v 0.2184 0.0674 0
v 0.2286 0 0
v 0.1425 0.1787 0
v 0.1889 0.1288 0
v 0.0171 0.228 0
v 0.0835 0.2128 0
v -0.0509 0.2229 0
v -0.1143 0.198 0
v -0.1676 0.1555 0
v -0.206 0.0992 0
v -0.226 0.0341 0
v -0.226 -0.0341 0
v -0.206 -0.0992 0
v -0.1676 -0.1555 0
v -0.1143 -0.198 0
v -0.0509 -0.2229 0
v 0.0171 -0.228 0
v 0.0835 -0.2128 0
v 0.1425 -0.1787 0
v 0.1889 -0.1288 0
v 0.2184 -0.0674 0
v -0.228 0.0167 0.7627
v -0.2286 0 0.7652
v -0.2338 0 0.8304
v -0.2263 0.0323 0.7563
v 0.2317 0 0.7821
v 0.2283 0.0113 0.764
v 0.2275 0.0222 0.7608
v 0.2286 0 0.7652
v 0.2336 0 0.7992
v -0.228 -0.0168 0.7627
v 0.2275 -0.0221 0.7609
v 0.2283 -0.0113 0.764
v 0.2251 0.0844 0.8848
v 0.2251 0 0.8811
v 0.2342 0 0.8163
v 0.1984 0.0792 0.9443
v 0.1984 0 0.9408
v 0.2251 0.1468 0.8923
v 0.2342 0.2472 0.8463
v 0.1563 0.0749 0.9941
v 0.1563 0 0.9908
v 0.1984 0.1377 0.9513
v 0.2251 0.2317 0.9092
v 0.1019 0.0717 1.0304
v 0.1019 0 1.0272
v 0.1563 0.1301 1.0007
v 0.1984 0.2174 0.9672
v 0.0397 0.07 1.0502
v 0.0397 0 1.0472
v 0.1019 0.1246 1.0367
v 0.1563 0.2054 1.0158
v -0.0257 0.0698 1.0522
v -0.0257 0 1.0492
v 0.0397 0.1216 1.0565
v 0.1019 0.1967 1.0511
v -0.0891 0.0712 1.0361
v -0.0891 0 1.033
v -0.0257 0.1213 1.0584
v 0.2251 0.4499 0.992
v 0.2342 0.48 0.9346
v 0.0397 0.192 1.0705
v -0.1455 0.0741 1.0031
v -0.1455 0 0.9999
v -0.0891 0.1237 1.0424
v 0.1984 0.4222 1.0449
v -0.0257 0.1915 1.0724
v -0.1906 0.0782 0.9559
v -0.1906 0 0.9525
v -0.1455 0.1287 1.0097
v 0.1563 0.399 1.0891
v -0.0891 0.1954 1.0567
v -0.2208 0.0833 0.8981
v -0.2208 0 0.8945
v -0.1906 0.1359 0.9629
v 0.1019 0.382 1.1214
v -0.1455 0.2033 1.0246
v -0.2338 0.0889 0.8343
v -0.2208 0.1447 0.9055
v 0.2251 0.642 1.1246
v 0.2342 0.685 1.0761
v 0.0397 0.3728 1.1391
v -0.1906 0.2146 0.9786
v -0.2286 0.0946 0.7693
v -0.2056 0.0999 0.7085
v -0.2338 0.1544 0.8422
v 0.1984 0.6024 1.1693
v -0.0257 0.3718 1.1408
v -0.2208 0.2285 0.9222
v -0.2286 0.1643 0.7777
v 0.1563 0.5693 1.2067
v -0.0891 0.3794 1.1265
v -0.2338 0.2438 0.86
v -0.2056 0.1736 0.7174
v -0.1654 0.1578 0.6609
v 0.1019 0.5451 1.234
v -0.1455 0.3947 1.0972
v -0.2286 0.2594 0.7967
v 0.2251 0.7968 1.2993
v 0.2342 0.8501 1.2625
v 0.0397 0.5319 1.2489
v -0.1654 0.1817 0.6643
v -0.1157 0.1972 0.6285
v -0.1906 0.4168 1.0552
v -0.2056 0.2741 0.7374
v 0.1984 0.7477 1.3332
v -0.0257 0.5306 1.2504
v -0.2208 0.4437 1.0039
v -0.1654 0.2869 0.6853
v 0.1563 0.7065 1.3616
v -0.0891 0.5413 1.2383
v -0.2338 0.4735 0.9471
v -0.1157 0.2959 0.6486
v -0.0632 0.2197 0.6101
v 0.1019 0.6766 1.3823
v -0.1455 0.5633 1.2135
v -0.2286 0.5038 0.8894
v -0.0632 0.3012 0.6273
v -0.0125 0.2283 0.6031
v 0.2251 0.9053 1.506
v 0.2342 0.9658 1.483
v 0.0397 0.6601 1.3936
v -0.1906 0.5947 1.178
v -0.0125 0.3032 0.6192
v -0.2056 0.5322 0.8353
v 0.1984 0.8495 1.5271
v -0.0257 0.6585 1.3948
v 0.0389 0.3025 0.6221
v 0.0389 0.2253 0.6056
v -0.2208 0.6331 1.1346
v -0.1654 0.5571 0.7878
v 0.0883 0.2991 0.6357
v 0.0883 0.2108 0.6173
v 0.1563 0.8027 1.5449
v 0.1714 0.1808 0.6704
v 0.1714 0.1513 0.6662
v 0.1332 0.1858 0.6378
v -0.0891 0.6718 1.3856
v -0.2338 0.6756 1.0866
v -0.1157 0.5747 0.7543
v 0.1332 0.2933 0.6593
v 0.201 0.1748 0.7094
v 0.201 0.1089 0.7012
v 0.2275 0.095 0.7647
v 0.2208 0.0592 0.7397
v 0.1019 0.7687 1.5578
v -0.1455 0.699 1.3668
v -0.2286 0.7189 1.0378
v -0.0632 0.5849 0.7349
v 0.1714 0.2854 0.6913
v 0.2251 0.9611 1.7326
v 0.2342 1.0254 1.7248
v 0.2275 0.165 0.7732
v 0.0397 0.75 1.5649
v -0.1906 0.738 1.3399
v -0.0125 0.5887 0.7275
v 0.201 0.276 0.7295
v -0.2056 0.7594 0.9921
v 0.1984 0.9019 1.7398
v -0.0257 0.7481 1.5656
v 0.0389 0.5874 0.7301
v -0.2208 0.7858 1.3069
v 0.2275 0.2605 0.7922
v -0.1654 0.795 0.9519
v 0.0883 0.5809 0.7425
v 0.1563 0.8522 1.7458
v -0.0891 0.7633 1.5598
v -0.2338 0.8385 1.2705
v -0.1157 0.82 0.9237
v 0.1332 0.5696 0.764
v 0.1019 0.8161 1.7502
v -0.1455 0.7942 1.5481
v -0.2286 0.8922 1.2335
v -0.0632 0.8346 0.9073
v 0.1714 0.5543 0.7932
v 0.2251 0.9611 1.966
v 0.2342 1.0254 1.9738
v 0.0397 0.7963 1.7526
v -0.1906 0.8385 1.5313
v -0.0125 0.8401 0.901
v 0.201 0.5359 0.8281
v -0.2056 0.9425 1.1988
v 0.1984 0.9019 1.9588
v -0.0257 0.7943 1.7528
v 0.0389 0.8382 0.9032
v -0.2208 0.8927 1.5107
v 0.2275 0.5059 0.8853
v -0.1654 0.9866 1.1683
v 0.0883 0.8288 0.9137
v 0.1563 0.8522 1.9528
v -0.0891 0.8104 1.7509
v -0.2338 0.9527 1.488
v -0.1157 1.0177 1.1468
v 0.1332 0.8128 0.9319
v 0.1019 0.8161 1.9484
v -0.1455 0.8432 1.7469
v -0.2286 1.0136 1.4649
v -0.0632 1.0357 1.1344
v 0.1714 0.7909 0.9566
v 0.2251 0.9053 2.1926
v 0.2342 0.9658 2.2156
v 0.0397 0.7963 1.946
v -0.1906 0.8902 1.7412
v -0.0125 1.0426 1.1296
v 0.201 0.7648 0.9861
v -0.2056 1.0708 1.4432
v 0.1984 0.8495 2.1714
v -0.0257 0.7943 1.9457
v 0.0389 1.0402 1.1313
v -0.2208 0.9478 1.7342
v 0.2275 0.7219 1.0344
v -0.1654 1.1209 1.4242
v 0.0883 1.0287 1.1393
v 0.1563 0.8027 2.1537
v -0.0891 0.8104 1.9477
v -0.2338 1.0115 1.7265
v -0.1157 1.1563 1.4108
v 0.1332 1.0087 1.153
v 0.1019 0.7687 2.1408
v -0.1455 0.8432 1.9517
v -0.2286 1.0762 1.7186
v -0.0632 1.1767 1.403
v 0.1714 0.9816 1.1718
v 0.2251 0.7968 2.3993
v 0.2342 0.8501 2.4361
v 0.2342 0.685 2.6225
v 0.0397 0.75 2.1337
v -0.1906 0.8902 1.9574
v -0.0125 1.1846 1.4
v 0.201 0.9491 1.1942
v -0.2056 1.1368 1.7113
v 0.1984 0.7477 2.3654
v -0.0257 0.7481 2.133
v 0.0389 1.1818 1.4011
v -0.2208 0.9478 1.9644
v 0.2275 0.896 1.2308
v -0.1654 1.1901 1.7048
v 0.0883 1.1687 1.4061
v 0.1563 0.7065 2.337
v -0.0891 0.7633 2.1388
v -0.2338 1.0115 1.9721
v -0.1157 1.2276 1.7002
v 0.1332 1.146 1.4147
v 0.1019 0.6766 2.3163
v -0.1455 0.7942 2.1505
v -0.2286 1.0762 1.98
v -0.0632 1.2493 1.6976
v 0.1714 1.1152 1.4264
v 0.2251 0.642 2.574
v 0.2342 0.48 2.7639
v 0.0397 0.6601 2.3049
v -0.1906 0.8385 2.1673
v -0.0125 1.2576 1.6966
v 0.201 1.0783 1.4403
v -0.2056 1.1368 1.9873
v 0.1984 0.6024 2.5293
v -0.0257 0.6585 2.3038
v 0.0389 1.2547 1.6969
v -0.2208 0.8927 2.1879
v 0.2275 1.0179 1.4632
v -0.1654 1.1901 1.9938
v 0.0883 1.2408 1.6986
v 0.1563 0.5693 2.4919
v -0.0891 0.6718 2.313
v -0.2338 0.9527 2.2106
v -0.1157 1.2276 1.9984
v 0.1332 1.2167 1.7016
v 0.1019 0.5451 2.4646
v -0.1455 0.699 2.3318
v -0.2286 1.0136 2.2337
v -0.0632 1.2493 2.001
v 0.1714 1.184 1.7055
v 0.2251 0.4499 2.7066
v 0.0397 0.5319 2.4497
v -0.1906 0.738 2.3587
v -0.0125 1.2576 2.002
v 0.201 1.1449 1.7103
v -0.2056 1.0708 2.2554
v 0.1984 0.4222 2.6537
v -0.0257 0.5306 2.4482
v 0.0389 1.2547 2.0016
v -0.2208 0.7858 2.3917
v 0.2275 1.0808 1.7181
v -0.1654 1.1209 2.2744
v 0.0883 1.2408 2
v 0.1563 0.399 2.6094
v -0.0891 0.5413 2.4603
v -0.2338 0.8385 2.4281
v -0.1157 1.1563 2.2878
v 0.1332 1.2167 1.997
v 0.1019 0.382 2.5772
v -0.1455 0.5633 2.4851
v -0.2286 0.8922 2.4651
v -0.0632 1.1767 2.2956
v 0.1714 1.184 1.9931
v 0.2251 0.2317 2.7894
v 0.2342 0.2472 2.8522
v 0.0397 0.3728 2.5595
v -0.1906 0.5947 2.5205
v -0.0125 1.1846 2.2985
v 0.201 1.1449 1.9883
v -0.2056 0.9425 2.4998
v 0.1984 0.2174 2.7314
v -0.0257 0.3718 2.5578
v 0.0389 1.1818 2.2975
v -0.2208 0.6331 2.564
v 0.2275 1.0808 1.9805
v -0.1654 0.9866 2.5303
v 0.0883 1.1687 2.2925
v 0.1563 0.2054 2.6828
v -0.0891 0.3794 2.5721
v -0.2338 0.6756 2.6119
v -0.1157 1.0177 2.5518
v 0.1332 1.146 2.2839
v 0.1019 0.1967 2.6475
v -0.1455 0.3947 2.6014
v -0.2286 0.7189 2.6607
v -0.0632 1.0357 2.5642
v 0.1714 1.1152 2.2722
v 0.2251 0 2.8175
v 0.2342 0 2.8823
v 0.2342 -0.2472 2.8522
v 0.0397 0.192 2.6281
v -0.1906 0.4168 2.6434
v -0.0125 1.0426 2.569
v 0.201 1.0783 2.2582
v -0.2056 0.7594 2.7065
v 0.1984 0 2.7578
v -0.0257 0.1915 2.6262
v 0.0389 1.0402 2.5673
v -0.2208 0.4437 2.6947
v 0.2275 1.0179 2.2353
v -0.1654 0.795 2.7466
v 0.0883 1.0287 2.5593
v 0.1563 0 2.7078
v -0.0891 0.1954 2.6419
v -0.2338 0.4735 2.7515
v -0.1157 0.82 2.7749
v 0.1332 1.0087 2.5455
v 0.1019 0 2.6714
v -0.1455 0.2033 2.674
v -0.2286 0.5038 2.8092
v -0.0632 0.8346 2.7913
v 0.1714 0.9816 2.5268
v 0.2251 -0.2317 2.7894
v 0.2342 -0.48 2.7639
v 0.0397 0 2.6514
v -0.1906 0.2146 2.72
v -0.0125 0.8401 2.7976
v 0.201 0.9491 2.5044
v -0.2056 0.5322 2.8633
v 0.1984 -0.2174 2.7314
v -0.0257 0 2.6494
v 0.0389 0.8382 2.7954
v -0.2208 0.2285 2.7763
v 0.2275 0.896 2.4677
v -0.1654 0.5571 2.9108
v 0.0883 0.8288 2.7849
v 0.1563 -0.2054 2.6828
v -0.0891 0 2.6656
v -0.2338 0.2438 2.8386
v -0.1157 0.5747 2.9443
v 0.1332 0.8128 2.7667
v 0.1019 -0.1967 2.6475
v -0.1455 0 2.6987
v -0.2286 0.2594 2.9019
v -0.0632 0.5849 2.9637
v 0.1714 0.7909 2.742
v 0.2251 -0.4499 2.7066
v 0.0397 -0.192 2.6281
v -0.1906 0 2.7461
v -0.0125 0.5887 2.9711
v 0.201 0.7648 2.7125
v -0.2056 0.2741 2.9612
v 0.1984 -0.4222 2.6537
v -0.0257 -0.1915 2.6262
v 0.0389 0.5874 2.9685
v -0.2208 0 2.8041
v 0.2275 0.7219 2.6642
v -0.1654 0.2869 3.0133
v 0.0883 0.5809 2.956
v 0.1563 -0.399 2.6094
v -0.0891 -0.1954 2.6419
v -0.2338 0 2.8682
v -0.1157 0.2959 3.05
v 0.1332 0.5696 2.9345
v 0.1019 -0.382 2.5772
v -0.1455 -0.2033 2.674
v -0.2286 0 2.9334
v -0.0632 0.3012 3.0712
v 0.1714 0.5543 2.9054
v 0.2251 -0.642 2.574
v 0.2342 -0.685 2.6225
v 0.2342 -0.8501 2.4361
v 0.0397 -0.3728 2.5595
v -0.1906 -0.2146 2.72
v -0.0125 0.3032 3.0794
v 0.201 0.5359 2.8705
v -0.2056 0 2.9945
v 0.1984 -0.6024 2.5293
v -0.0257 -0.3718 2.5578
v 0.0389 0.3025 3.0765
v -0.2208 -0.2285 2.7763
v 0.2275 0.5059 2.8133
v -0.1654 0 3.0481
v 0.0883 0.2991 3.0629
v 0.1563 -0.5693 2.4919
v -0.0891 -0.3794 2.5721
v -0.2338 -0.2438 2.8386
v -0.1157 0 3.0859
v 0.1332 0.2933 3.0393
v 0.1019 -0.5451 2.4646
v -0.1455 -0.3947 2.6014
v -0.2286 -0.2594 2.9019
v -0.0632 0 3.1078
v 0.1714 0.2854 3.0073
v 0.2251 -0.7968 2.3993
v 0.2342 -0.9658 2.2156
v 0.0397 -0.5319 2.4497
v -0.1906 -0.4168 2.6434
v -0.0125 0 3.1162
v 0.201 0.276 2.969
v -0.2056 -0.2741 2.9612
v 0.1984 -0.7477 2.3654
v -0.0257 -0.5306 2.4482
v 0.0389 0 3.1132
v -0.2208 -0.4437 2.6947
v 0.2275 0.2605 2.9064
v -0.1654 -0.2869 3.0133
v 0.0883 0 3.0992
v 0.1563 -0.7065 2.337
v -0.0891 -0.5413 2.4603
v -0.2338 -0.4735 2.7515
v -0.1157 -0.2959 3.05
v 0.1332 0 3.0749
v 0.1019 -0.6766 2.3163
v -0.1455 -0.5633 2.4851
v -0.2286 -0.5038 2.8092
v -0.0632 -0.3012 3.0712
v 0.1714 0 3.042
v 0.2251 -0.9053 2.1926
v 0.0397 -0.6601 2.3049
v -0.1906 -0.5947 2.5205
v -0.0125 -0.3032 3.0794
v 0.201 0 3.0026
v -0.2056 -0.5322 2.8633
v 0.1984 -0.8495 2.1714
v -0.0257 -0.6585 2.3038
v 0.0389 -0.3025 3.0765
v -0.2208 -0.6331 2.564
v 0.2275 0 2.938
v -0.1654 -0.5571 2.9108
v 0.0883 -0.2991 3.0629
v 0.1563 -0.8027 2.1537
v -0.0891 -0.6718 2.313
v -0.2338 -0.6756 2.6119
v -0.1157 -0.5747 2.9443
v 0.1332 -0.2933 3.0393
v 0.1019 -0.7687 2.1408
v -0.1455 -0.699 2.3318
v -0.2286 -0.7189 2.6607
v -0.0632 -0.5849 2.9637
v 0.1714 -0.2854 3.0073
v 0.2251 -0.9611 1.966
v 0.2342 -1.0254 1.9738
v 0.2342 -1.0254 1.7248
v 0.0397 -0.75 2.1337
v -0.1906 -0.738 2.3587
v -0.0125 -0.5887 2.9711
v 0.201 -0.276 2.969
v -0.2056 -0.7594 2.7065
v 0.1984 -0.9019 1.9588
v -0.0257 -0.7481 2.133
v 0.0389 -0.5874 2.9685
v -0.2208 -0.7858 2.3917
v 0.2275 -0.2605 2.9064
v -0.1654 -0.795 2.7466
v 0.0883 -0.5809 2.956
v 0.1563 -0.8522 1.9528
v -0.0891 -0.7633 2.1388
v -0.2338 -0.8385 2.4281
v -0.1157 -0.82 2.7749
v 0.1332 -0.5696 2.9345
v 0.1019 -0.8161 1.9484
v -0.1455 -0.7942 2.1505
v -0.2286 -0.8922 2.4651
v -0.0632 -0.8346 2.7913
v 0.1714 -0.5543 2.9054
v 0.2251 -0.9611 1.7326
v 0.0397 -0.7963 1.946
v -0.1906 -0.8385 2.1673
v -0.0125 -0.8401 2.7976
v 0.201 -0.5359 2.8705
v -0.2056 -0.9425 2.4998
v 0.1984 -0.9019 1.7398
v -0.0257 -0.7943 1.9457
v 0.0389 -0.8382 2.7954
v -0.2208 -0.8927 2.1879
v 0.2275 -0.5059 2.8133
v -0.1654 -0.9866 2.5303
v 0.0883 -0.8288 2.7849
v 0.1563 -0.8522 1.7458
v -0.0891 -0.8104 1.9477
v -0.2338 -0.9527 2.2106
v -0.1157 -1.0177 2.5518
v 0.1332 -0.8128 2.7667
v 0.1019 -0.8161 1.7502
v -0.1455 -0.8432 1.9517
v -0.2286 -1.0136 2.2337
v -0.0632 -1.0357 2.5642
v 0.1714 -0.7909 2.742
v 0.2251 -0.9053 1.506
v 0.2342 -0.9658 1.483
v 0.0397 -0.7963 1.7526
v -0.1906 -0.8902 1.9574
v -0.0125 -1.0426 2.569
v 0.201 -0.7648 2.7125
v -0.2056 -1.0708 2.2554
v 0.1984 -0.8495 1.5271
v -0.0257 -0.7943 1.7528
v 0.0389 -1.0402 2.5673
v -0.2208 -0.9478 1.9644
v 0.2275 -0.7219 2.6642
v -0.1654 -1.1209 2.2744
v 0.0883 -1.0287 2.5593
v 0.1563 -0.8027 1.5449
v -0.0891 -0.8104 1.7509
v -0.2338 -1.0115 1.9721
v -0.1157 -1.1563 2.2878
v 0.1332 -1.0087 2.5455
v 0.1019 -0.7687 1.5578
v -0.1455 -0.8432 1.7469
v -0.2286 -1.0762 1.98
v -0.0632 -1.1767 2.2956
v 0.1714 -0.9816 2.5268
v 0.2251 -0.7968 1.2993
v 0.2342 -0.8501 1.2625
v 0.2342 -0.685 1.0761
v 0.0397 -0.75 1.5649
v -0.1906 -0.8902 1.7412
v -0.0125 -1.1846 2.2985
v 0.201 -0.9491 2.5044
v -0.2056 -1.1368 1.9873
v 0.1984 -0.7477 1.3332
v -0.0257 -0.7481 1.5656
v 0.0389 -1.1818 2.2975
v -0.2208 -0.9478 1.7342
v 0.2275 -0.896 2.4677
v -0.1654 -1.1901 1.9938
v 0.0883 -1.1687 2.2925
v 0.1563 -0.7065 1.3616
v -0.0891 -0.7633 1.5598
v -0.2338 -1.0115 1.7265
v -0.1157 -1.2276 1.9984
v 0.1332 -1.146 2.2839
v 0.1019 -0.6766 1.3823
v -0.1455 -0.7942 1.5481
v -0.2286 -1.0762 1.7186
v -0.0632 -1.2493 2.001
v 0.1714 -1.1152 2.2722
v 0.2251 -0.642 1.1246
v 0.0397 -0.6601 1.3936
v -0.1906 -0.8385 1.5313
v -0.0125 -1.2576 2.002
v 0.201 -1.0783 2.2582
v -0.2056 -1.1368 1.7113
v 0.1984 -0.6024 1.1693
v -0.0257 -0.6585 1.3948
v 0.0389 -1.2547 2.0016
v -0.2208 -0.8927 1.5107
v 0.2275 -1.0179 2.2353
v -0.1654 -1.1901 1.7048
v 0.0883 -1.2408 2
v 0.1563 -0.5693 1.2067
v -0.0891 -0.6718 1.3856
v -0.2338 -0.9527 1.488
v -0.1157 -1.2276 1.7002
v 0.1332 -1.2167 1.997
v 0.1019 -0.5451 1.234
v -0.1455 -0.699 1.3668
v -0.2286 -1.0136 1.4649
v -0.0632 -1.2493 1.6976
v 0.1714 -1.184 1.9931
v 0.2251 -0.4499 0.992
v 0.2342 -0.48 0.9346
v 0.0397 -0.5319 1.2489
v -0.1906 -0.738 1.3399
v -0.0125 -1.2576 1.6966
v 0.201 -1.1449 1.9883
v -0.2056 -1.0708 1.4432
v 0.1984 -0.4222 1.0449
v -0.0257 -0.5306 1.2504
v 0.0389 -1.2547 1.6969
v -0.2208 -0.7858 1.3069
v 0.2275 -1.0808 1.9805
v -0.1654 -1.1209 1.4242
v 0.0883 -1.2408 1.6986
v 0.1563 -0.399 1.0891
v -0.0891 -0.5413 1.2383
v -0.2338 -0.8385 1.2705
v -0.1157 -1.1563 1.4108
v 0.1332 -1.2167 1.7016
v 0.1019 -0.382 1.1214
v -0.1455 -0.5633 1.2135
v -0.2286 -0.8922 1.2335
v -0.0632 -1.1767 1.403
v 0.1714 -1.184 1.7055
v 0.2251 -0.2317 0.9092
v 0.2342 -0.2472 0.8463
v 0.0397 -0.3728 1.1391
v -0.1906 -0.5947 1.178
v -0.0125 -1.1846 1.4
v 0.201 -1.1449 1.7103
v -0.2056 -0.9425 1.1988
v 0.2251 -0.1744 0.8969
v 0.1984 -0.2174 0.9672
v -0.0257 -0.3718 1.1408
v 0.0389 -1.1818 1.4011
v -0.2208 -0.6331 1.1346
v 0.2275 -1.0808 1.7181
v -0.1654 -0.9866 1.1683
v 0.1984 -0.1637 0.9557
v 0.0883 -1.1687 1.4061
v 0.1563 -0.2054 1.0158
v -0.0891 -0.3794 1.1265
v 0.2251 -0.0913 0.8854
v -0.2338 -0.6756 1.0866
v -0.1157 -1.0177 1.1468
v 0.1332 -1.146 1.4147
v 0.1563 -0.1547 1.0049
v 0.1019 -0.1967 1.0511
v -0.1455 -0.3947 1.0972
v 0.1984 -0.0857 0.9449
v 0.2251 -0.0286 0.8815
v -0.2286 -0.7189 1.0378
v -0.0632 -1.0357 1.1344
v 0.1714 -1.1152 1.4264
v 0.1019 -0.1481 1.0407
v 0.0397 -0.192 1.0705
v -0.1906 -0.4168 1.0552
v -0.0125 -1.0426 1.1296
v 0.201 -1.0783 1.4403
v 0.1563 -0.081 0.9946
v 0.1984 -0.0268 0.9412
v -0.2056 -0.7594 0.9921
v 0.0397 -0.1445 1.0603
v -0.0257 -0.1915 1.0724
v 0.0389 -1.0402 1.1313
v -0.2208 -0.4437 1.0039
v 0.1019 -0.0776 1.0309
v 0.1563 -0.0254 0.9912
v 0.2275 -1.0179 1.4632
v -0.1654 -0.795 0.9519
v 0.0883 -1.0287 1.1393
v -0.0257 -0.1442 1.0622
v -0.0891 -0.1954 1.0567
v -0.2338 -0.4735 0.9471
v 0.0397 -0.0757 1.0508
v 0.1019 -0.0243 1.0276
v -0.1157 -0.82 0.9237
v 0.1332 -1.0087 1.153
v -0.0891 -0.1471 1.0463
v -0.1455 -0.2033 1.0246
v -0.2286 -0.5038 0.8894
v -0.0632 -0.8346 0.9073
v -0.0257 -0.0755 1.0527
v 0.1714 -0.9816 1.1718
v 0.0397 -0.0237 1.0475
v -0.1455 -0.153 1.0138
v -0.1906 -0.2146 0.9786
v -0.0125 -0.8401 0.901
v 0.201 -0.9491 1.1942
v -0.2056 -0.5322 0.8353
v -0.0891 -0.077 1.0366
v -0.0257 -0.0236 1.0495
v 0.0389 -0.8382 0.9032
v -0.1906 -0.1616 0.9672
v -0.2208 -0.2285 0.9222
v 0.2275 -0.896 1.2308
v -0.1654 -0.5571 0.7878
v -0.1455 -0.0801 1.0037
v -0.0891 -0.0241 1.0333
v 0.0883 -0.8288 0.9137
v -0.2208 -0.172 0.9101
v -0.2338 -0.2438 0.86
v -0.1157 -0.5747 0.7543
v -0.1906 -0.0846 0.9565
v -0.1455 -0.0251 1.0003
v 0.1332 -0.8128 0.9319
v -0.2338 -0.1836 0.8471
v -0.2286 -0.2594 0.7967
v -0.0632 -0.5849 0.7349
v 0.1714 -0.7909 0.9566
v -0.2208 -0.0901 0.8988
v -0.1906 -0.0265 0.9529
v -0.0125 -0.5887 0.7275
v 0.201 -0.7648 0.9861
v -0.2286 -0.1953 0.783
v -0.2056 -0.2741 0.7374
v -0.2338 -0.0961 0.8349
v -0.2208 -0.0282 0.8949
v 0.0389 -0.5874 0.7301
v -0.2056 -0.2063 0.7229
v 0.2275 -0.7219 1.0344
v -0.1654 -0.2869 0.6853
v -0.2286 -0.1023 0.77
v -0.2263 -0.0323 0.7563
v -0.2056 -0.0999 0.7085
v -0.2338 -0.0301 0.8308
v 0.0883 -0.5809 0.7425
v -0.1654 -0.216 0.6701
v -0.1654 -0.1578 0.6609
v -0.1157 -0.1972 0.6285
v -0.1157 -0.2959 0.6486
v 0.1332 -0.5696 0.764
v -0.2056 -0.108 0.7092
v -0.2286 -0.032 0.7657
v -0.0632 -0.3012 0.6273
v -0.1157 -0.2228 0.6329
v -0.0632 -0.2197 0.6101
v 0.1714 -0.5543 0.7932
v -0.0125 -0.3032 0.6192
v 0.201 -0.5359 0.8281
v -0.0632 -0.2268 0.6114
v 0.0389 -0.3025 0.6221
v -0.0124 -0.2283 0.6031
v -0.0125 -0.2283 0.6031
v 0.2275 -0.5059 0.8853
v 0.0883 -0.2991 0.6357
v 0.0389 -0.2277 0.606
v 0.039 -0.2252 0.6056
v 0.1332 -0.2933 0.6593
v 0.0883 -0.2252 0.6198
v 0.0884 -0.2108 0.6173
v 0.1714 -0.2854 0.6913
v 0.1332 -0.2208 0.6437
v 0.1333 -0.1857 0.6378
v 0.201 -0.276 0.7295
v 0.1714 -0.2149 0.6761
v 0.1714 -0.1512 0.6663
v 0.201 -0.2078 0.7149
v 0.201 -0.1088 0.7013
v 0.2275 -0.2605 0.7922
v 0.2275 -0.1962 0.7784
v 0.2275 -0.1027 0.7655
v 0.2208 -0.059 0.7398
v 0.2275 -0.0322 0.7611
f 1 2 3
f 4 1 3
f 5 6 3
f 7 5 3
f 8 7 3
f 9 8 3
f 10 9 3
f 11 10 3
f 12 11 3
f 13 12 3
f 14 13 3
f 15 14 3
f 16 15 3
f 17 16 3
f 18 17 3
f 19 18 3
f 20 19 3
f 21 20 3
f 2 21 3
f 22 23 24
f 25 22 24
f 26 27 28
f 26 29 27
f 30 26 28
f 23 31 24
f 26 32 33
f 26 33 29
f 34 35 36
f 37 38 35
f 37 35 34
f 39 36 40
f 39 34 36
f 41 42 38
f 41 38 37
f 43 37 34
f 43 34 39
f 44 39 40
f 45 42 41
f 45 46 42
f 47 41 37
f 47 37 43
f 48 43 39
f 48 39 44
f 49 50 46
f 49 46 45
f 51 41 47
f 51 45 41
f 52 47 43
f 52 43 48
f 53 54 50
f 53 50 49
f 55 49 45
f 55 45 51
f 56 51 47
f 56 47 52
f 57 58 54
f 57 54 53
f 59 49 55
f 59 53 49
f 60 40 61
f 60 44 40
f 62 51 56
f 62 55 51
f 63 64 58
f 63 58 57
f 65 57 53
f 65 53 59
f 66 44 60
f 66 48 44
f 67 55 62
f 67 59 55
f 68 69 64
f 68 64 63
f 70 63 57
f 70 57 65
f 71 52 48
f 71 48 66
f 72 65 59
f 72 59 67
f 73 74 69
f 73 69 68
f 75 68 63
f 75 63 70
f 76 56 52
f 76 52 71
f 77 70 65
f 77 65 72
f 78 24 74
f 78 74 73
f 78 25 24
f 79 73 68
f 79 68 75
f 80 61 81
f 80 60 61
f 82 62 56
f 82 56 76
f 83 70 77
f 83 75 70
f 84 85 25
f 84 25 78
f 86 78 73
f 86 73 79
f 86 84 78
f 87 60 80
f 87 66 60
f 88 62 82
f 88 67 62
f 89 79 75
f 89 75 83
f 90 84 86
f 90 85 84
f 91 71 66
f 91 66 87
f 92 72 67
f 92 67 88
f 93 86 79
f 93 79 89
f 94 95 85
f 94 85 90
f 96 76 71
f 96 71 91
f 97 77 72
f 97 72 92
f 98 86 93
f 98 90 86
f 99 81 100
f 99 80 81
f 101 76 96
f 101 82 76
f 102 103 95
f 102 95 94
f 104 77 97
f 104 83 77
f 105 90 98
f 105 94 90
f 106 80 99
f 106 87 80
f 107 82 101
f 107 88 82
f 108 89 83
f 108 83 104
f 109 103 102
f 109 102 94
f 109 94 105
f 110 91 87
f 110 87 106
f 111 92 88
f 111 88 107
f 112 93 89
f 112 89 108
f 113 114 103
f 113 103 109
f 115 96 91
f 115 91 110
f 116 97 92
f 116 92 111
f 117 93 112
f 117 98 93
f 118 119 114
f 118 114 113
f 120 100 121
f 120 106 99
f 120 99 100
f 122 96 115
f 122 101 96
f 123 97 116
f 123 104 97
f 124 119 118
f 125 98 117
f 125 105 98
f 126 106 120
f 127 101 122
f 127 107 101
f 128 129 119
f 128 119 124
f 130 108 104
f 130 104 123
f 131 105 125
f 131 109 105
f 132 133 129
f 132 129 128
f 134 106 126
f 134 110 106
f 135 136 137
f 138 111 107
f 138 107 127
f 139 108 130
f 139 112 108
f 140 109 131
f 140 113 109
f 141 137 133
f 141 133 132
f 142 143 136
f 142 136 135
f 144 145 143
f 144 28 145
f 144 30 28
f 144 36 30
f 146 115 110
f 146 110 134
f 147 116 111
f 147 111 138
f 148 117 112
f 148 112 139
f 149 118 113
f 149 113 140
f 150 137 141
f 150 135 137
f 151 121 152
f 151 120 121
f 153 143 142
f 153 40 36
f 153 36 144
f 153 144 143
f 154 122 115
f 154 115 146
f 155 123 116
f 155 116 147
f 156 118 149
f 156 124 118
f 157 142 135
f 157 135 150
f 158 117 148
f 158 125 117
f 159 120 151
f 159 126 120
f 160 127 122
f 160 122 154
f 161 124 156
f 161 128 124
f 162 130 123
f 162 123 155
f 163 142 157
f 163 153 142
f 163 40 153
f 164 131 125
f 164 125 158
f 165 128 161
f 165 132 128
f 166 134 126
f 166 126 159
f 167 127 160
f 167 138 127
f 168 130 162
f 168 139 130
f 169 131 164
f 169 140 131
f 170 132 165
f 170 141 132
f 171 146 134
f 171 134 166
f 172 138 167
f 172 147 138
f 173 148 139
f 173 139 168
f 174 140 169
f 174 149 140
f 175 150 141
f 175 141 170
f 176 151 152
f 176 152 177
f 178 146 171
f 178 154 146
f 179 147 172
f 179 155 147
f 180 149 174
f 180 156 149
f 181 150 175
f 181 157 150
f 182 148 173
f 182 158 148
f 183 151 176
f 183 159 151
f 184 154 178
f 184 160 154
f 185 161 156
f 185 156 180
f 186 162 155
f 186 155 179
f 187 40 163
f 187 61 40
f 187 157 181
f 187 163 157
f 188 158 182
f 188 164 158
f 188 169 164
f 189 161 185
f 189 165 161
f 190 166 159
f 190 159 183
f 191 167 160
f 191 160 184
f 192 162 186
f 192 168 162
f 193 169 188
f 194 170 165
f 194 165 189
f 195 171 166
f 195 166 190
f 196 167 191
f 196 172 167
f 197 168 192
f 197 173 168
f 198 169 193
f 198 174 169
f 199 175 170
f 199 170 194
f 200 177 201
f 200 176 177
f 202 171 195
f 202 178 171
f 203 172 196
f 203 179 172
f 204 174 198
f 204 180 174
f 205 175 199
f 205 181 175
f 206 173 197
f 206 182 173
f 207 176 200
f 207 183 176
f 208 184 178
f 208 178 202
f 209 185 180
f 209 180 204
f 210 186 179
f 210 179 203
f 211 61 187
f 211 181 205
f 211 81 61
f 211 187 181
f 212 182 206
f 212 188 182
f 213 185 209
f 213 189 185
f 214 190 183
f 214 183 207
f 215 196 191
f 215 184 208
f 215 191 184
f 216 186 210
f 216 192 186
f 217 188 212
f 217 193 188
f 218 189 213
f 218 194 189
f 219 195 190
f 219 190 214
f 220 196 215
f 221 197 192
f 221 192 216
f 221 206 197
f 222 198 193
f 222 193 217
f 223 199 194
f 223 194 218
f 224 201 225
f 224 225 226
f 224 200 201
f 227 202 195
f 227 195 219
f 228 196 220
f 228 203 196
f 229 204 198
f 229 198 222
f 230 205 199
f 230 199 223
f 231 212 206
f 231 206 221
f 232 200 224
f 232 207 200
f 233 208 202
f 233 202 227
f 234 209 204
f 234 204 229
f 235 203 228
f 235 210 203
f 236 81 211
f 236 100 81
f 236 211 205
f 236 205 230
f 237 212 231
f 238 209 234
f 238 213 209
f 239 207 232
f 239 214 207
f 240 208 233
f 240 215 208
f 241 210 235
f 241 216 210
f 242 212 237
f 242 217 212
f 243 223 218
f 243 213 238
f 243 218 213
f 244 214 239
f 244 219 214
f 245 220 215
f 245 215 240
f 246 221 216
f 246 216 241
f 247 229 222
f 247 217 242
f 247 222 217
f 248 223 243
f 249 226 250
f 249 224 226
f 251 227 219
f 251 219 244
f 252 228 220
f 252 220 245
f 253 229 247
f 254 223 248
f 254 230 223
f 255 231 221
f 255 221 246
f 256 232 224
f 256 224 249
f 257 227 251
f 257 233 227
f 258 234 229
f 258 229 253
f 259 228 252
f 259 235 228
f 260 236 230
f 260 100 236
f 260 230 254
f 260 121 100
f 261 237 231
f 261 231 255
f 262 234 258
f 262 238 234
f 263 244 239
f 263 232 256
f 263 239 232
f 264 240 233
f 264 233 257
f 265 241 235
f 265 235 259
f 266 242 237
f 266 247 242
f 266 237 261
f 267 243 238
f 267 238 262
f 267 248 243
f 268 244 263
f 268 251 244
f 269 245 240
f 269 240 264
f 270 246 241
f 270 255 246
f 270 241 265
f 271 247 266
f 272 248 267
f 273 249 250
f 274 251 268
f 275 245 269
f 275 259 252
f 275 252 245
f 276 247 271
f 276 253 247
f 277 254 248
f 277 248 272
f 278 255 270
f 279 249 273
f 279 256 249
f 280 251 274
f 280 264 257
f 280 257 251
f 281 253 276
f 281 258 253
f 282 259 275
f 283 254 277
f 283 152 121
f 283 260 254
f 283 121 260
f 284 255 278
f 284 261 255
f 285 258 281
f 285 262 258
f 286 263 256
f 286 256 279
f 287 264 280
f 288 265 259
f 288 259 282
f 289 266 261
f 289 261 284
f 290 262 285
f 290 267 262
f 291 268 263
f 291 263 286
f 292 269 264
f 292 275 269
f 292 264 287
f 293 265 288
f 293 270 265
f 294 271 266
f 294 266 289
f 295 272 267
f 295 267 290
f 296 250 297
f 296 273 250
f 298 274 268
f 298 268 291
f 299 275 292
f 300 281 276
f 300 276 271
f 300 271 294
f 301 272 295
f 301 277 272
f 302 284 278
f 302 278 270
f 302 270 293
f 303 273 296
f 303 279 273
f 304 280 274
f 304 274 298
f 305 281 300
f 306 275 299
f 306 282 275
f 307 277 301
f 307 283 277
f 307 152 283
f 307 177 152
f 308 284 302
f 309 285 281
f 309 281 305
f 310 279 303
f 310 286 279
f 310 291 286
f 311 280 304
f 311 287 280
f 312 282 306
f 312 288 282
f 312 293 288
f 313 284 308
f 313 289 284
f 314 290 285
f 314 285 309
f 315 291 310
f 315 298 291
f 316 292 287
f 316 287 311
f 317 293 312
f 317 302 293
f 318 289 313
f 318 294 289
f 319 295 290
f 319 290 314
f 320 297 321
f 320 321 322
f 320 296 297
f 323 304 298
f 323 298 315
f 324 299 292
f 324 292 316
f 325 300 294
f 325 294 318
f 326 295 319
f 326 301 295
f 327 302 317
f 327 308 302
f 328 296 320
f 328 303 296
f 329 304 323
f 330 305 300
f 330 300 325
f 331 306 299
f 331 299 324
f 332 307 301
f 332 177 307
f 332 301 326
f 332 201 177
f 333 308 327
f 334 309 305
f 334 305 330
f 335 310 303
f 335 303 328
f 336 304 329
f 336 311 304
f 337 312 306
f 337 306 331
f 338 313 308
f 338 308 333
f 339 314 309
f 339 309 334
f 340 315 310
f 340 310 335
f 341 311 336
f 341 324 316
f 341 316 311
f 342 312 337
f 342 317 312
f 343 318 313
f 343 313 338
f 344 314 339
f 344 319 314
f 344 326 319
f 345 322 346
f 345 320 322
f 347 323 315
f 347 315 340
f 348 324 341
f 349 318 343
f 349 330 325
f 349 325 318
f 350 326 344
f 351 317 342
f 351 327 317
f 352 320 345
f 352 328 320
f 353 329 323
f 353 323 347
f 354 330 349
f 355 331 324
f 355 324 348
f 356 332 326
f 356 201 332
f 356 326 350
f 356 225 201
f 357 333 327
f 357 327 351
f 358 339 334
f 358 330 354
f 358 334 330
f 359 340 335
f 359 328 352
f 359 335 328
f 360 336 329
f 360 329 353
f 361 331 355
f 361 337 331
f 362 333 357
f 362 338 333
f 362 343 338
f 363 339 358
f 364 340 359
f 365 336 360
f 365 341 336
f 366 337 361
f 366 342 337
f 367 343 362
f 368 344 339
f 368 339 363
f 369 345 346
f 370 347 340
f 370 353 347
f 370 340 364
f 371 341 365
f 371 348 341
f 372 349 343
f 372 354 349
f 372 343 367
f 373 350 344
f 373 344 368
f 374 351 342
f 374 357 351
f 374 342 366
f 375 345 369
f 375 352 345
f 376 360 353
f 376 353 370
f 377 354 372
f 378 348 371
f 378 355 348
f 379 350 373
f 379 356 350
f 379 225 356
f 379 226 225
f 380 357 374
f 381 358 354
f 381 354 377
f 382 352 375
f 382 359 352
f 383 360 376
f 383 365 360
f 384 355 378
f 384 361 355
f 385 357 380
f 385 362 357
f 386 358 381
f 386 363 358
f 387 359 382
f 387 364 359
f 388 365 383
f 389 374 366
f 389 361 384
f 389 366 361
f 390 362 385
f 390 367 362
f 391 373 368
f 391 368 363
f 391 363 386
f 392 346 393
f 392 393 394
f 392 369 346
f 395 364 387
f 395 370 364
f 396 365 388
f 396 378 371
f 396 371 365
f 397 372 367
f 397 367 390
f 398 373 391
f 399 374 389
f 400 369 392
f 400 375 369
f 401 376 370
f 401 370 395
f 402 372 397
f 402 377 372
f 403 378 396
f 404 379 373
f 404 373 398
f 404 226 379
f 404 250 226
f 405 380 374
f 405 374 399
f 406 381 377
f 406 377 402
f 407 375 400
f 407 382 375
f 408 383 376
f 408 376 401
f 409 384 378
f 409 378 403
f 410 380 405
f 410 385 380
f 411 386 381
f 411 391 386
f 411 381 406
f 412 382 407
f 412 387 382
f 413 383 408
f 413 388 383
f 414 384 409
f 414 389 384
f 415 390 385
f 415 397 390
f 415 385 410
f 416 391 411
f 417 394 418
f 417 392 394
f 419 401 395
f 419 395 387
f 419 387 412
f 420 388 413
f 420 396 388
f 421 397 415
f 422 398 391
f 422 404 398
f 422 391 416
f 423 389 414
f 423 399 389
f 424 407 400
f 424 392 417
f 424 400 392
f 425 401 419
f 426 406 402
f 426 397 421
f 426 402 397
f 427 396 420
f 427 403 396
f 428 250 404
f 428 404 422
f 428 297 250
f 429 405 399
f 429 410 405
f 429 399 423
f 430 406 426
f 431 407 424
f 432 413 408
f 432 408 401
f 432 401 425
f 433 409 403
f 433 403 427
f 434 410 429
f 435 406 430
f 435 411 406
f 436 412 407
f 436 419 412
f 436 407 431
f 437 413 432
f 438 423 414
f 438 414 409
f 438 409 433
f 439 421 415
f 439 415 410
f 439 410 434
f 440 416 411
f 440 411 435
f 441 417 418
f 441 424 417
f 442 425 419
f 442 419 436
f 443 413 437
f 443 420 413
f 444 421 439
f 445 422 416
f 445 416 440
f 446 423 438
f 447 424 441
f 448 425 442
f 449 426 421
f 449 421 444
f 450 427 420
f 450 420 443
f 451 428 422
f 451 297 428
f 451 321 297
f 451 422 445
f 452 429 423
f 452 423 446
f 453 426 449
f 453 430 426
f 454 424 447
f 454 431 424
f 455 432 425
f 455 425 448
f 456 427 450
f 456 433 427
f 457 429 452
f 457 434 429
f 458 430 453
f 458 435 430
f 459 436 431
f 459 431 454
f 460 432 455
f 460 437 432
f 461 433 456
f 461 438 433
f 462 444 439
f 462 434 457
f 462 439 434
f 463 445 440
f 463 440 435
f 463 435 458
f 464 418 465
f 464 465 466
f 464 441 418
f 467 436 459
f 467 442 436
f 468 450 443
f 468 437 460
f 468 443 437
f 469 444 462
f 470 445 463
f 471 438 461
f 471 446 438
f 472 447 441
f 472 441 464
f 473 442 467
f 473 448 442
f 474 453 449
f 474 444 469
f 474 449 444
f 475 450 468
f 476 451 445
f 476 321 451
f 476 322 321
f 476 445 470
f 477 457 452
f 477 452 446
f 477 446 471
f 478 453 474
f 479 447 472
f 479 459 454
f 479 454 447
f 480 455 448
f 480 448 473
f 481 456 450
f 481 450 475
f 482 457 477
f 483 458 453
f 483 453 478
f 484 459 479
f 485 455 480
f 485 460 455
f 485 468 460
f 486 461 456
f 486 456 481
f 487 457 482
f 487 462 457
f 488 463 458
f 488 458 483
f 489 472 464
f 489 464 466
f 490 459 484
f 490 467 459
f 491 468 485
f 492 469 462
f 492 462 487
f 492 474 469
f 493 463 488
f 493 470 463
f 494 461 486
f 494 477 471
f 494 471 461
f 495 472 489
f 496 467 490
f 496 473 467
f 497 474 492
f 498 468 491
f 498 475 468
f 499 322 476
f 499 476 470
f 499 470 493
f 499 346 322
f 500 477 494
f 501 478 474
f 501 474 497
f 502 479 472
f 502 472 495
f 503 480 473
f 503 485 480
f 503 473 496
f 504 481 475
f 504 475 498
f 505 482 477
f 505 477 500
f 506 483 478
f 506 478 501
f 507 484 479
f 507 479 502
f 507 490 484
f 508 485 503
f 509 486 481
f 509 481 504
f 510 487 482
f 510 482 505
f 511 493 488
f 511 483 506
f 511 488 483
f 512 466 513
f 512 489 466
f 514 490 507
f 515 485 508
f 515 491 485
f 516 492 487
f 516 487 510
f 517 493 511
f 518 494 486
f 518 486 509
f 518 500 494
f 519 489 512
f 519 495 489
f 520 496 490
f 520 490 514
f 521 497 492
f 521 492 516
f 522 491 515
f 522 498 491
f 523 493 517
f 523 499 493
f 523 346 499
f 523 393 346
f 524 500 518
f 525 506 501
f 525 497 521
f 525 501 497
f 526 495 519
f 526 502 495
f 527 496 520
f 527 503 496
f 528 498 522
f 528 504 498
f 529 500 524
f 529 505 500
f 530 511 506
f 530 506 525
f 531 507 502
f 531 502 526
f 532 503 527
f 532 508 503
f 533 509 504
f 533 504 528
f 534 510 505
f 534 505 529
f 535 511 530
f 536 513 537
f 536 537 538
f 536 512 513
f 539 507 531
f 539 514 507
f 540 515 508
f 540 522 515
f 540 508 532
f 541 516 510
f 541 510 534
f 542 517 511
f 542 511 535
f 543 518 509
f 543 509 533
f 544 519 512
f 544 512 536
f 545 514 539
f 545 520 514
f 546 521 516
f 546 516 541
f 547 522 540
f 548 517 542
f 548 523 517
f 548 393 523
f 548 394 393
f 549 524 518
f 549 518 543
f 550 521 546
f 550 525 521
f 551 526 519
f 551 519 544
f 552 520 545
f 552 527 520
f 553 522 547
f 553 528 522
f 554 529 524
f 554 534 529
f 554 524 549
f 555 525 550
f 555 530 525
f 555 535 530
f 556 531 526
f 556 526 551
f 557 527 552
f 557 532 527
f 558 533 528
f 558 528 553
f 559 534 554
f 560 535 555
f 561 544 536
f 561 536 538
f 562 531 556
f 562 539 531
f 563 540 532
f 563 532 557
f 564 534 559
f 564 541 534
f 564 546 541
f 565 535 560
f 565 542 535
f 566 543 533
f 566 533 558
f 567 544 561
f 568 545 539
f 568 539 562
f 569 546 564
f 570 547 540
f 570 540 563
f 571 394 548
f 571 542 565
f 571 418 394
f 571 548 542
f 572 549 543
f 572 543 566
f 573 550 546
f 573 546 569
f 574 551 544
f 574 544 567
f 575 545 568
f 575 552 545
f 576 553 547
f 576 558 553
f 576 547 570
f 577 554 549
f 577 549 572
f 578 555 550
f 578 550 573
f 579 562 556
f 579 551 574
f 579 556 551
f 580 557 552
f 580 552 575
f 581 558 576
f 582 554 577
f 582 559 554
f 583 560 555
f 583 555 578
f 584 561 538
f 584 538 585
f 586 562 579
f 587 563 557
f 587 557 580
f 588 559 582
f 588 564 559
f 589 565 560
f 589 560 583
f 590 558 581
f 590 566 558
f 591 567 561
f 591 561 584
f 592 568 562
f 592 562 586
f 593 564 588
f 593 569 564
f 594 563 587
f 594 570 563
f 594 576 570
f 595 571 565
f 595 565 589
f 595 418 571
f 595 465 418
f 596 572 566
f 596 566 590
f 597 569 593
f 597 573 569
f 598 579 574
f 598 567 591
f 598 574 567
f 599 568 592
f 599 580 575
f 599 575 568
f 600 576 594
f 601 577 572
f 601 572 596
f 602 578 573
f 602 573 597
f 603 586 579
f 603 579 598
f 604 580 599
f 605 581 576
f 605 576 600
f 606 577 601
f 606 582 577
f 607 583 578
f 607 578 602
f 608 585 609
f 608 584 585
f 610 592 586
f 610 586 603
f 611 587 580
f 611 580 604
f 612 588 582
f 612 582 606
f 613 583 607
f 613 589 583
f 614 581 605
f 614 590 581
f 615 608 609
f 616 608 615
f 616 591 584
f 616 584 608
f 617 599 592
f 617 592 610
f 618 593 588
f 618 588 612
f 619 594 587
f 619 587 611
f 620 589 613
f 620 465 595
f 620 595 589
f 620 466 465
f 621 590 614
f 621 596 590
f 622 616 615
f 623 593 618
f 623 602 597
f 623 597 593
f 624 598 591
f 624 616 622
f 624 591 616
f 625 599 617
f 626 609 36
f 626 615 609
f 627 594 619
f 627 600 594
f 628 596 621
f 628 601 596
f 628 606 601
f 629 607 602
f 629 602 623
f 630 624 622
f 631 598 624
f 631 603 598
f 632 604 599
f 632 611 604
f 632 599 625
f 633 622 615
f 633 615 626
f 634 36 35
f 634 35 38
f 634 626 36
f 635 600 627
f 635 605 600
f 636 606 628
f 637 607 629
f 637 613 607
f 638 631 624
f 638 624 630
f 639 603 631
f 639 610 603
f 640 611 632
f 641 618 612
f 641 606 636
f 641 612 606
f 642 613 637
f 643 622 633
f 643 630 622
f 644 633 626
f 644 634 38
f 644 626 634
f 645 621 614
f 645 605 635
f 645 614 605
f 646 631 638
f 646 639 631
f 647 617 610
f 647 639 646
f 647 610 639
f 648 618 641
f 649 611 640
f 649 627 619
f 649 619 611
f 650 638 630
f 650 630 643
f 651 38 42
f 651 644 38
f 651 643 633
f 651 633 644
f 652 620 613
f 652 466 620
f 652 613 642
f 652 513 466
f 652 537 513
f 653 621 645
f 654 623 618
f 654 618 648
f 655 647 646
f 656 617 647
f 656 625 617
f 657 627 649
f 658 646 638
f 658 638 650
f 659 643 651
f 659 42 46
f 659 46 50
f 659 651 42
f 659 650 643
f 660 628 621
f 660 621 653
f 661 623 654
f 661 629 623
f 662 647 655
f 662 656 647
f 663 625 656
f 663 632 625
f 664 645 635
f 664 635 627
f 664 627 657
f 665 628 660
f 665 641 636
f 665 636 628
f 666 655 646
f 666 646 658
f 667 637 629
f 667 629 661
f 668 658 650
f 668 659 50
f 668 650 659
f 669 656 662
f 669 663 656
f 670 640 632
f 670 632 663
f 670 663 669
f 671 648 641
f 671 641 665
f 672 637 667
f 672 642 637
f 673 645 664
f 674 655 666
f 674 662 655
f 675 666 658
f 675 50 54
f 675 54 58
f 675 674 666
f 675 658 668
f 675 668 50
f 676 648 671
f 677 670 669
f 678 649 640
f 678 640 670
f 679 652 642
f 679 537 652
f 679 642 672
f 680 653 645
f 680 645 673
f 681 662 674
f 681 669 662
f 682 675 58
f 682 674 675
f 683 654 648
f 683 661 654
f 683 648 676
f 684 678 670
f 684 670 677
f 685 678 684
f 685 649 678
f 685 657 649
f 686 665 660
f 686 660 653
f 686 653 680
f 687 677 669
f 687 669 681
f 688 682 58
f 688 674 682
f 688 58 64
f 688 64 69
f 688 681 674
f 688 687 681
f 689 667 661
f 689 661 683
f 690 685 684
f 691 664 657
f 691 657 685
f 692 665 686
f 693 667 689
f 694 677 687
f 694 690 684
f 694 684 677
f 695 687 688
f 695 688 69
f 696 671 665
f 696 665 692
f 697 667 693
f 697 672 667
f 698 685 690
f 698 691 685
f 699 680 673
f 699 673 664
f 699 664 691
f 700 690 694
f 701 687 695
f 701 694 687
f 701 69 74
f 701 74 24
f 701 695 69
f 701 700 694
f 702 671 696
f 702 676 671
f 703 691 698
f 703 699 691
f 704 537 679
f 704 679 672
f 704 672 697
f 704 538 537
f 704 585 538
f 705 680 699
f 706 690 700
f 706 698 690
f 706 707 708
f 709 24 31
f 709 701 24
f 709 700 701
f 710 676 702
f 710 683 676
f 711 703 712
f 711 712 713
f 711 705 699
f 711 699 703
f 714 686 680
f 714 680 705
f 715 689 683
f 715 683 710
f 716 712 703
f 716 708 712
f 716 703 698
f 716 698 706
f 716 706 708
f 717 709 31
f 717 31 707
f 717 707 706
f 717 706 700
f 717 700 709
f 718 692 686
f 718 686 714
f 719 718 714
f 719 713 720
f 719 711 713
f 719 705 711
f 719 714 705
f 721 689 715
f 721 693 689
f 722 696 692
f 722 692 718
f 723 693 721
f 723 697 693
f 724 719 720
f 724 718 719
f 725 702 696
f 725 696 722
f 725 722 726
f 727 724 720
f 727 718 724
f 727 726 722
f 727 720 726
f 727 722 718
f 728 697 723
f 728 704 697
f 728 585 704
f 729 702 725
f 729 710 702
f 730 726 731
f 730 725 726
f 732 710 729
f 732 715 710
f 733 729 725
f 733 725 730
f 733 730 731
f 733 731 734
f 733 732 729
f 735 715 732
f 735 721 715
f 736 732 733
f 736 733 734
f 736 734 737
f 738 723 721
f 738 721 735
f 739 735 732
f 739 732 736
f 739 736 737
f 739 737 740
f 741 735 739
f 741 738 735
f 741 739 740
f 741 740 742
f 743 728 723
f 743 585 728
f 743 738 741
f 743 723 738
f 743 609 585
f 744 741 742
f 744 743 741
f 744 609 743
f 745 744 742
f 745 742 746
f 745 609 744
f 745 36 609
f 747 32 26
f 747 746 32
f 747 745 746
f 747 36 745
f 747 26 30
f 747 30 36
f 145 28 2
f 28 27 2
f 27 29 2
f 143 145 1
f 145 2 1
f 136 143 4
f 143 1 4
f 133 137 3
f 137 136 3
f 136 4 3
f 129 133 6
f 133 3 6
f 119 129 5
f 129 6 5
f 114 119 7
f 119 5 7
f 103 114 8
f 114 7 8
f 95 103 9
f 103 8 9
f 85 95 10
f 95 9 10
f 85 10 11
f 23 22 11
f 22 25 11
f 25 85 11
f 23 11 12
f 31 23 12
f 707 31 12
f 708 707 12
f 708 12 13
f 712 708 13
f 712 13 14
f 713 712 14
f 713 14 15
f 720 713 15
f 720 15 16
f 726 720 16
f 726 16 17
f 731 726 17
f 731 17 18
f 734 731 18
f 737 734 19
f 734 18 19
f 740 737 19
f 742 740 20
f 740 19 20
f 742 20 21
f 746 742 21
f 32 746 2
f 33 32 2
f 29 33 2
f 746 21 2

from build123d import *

# Parameters (mm, degrees)
F0_R     = 3.175
F1_DEPTH = 152.4
F3_R     = 0.2286
F4_DEPTH = 0.8128
F6_R     = 0.2342445073


with BuildPart() as f1:
    # F0 (on Top) → F1 (new body)
    with BuildSketch(Plane.XY):
        Circle(F0_R)
    extrude(amount=F1_DEPTH)


with BuildPart() as f4:
    # F3 (on Top) → F4 (new body)
    with BuildSketch(Plane.XY):
        Circle(F3_R)
    extrude(amount=F4_DEPTH)

    # F6 (on Front) → F7 (revolve)
    with BuildSketch(Plane.XZ):
        with Locations((0, 0.8163214079)):
            Circle(F6_R)
    revolve(axis=Axis((0, 0, 1.8492907984), (1, 0, 0)))


solid = f4.part
